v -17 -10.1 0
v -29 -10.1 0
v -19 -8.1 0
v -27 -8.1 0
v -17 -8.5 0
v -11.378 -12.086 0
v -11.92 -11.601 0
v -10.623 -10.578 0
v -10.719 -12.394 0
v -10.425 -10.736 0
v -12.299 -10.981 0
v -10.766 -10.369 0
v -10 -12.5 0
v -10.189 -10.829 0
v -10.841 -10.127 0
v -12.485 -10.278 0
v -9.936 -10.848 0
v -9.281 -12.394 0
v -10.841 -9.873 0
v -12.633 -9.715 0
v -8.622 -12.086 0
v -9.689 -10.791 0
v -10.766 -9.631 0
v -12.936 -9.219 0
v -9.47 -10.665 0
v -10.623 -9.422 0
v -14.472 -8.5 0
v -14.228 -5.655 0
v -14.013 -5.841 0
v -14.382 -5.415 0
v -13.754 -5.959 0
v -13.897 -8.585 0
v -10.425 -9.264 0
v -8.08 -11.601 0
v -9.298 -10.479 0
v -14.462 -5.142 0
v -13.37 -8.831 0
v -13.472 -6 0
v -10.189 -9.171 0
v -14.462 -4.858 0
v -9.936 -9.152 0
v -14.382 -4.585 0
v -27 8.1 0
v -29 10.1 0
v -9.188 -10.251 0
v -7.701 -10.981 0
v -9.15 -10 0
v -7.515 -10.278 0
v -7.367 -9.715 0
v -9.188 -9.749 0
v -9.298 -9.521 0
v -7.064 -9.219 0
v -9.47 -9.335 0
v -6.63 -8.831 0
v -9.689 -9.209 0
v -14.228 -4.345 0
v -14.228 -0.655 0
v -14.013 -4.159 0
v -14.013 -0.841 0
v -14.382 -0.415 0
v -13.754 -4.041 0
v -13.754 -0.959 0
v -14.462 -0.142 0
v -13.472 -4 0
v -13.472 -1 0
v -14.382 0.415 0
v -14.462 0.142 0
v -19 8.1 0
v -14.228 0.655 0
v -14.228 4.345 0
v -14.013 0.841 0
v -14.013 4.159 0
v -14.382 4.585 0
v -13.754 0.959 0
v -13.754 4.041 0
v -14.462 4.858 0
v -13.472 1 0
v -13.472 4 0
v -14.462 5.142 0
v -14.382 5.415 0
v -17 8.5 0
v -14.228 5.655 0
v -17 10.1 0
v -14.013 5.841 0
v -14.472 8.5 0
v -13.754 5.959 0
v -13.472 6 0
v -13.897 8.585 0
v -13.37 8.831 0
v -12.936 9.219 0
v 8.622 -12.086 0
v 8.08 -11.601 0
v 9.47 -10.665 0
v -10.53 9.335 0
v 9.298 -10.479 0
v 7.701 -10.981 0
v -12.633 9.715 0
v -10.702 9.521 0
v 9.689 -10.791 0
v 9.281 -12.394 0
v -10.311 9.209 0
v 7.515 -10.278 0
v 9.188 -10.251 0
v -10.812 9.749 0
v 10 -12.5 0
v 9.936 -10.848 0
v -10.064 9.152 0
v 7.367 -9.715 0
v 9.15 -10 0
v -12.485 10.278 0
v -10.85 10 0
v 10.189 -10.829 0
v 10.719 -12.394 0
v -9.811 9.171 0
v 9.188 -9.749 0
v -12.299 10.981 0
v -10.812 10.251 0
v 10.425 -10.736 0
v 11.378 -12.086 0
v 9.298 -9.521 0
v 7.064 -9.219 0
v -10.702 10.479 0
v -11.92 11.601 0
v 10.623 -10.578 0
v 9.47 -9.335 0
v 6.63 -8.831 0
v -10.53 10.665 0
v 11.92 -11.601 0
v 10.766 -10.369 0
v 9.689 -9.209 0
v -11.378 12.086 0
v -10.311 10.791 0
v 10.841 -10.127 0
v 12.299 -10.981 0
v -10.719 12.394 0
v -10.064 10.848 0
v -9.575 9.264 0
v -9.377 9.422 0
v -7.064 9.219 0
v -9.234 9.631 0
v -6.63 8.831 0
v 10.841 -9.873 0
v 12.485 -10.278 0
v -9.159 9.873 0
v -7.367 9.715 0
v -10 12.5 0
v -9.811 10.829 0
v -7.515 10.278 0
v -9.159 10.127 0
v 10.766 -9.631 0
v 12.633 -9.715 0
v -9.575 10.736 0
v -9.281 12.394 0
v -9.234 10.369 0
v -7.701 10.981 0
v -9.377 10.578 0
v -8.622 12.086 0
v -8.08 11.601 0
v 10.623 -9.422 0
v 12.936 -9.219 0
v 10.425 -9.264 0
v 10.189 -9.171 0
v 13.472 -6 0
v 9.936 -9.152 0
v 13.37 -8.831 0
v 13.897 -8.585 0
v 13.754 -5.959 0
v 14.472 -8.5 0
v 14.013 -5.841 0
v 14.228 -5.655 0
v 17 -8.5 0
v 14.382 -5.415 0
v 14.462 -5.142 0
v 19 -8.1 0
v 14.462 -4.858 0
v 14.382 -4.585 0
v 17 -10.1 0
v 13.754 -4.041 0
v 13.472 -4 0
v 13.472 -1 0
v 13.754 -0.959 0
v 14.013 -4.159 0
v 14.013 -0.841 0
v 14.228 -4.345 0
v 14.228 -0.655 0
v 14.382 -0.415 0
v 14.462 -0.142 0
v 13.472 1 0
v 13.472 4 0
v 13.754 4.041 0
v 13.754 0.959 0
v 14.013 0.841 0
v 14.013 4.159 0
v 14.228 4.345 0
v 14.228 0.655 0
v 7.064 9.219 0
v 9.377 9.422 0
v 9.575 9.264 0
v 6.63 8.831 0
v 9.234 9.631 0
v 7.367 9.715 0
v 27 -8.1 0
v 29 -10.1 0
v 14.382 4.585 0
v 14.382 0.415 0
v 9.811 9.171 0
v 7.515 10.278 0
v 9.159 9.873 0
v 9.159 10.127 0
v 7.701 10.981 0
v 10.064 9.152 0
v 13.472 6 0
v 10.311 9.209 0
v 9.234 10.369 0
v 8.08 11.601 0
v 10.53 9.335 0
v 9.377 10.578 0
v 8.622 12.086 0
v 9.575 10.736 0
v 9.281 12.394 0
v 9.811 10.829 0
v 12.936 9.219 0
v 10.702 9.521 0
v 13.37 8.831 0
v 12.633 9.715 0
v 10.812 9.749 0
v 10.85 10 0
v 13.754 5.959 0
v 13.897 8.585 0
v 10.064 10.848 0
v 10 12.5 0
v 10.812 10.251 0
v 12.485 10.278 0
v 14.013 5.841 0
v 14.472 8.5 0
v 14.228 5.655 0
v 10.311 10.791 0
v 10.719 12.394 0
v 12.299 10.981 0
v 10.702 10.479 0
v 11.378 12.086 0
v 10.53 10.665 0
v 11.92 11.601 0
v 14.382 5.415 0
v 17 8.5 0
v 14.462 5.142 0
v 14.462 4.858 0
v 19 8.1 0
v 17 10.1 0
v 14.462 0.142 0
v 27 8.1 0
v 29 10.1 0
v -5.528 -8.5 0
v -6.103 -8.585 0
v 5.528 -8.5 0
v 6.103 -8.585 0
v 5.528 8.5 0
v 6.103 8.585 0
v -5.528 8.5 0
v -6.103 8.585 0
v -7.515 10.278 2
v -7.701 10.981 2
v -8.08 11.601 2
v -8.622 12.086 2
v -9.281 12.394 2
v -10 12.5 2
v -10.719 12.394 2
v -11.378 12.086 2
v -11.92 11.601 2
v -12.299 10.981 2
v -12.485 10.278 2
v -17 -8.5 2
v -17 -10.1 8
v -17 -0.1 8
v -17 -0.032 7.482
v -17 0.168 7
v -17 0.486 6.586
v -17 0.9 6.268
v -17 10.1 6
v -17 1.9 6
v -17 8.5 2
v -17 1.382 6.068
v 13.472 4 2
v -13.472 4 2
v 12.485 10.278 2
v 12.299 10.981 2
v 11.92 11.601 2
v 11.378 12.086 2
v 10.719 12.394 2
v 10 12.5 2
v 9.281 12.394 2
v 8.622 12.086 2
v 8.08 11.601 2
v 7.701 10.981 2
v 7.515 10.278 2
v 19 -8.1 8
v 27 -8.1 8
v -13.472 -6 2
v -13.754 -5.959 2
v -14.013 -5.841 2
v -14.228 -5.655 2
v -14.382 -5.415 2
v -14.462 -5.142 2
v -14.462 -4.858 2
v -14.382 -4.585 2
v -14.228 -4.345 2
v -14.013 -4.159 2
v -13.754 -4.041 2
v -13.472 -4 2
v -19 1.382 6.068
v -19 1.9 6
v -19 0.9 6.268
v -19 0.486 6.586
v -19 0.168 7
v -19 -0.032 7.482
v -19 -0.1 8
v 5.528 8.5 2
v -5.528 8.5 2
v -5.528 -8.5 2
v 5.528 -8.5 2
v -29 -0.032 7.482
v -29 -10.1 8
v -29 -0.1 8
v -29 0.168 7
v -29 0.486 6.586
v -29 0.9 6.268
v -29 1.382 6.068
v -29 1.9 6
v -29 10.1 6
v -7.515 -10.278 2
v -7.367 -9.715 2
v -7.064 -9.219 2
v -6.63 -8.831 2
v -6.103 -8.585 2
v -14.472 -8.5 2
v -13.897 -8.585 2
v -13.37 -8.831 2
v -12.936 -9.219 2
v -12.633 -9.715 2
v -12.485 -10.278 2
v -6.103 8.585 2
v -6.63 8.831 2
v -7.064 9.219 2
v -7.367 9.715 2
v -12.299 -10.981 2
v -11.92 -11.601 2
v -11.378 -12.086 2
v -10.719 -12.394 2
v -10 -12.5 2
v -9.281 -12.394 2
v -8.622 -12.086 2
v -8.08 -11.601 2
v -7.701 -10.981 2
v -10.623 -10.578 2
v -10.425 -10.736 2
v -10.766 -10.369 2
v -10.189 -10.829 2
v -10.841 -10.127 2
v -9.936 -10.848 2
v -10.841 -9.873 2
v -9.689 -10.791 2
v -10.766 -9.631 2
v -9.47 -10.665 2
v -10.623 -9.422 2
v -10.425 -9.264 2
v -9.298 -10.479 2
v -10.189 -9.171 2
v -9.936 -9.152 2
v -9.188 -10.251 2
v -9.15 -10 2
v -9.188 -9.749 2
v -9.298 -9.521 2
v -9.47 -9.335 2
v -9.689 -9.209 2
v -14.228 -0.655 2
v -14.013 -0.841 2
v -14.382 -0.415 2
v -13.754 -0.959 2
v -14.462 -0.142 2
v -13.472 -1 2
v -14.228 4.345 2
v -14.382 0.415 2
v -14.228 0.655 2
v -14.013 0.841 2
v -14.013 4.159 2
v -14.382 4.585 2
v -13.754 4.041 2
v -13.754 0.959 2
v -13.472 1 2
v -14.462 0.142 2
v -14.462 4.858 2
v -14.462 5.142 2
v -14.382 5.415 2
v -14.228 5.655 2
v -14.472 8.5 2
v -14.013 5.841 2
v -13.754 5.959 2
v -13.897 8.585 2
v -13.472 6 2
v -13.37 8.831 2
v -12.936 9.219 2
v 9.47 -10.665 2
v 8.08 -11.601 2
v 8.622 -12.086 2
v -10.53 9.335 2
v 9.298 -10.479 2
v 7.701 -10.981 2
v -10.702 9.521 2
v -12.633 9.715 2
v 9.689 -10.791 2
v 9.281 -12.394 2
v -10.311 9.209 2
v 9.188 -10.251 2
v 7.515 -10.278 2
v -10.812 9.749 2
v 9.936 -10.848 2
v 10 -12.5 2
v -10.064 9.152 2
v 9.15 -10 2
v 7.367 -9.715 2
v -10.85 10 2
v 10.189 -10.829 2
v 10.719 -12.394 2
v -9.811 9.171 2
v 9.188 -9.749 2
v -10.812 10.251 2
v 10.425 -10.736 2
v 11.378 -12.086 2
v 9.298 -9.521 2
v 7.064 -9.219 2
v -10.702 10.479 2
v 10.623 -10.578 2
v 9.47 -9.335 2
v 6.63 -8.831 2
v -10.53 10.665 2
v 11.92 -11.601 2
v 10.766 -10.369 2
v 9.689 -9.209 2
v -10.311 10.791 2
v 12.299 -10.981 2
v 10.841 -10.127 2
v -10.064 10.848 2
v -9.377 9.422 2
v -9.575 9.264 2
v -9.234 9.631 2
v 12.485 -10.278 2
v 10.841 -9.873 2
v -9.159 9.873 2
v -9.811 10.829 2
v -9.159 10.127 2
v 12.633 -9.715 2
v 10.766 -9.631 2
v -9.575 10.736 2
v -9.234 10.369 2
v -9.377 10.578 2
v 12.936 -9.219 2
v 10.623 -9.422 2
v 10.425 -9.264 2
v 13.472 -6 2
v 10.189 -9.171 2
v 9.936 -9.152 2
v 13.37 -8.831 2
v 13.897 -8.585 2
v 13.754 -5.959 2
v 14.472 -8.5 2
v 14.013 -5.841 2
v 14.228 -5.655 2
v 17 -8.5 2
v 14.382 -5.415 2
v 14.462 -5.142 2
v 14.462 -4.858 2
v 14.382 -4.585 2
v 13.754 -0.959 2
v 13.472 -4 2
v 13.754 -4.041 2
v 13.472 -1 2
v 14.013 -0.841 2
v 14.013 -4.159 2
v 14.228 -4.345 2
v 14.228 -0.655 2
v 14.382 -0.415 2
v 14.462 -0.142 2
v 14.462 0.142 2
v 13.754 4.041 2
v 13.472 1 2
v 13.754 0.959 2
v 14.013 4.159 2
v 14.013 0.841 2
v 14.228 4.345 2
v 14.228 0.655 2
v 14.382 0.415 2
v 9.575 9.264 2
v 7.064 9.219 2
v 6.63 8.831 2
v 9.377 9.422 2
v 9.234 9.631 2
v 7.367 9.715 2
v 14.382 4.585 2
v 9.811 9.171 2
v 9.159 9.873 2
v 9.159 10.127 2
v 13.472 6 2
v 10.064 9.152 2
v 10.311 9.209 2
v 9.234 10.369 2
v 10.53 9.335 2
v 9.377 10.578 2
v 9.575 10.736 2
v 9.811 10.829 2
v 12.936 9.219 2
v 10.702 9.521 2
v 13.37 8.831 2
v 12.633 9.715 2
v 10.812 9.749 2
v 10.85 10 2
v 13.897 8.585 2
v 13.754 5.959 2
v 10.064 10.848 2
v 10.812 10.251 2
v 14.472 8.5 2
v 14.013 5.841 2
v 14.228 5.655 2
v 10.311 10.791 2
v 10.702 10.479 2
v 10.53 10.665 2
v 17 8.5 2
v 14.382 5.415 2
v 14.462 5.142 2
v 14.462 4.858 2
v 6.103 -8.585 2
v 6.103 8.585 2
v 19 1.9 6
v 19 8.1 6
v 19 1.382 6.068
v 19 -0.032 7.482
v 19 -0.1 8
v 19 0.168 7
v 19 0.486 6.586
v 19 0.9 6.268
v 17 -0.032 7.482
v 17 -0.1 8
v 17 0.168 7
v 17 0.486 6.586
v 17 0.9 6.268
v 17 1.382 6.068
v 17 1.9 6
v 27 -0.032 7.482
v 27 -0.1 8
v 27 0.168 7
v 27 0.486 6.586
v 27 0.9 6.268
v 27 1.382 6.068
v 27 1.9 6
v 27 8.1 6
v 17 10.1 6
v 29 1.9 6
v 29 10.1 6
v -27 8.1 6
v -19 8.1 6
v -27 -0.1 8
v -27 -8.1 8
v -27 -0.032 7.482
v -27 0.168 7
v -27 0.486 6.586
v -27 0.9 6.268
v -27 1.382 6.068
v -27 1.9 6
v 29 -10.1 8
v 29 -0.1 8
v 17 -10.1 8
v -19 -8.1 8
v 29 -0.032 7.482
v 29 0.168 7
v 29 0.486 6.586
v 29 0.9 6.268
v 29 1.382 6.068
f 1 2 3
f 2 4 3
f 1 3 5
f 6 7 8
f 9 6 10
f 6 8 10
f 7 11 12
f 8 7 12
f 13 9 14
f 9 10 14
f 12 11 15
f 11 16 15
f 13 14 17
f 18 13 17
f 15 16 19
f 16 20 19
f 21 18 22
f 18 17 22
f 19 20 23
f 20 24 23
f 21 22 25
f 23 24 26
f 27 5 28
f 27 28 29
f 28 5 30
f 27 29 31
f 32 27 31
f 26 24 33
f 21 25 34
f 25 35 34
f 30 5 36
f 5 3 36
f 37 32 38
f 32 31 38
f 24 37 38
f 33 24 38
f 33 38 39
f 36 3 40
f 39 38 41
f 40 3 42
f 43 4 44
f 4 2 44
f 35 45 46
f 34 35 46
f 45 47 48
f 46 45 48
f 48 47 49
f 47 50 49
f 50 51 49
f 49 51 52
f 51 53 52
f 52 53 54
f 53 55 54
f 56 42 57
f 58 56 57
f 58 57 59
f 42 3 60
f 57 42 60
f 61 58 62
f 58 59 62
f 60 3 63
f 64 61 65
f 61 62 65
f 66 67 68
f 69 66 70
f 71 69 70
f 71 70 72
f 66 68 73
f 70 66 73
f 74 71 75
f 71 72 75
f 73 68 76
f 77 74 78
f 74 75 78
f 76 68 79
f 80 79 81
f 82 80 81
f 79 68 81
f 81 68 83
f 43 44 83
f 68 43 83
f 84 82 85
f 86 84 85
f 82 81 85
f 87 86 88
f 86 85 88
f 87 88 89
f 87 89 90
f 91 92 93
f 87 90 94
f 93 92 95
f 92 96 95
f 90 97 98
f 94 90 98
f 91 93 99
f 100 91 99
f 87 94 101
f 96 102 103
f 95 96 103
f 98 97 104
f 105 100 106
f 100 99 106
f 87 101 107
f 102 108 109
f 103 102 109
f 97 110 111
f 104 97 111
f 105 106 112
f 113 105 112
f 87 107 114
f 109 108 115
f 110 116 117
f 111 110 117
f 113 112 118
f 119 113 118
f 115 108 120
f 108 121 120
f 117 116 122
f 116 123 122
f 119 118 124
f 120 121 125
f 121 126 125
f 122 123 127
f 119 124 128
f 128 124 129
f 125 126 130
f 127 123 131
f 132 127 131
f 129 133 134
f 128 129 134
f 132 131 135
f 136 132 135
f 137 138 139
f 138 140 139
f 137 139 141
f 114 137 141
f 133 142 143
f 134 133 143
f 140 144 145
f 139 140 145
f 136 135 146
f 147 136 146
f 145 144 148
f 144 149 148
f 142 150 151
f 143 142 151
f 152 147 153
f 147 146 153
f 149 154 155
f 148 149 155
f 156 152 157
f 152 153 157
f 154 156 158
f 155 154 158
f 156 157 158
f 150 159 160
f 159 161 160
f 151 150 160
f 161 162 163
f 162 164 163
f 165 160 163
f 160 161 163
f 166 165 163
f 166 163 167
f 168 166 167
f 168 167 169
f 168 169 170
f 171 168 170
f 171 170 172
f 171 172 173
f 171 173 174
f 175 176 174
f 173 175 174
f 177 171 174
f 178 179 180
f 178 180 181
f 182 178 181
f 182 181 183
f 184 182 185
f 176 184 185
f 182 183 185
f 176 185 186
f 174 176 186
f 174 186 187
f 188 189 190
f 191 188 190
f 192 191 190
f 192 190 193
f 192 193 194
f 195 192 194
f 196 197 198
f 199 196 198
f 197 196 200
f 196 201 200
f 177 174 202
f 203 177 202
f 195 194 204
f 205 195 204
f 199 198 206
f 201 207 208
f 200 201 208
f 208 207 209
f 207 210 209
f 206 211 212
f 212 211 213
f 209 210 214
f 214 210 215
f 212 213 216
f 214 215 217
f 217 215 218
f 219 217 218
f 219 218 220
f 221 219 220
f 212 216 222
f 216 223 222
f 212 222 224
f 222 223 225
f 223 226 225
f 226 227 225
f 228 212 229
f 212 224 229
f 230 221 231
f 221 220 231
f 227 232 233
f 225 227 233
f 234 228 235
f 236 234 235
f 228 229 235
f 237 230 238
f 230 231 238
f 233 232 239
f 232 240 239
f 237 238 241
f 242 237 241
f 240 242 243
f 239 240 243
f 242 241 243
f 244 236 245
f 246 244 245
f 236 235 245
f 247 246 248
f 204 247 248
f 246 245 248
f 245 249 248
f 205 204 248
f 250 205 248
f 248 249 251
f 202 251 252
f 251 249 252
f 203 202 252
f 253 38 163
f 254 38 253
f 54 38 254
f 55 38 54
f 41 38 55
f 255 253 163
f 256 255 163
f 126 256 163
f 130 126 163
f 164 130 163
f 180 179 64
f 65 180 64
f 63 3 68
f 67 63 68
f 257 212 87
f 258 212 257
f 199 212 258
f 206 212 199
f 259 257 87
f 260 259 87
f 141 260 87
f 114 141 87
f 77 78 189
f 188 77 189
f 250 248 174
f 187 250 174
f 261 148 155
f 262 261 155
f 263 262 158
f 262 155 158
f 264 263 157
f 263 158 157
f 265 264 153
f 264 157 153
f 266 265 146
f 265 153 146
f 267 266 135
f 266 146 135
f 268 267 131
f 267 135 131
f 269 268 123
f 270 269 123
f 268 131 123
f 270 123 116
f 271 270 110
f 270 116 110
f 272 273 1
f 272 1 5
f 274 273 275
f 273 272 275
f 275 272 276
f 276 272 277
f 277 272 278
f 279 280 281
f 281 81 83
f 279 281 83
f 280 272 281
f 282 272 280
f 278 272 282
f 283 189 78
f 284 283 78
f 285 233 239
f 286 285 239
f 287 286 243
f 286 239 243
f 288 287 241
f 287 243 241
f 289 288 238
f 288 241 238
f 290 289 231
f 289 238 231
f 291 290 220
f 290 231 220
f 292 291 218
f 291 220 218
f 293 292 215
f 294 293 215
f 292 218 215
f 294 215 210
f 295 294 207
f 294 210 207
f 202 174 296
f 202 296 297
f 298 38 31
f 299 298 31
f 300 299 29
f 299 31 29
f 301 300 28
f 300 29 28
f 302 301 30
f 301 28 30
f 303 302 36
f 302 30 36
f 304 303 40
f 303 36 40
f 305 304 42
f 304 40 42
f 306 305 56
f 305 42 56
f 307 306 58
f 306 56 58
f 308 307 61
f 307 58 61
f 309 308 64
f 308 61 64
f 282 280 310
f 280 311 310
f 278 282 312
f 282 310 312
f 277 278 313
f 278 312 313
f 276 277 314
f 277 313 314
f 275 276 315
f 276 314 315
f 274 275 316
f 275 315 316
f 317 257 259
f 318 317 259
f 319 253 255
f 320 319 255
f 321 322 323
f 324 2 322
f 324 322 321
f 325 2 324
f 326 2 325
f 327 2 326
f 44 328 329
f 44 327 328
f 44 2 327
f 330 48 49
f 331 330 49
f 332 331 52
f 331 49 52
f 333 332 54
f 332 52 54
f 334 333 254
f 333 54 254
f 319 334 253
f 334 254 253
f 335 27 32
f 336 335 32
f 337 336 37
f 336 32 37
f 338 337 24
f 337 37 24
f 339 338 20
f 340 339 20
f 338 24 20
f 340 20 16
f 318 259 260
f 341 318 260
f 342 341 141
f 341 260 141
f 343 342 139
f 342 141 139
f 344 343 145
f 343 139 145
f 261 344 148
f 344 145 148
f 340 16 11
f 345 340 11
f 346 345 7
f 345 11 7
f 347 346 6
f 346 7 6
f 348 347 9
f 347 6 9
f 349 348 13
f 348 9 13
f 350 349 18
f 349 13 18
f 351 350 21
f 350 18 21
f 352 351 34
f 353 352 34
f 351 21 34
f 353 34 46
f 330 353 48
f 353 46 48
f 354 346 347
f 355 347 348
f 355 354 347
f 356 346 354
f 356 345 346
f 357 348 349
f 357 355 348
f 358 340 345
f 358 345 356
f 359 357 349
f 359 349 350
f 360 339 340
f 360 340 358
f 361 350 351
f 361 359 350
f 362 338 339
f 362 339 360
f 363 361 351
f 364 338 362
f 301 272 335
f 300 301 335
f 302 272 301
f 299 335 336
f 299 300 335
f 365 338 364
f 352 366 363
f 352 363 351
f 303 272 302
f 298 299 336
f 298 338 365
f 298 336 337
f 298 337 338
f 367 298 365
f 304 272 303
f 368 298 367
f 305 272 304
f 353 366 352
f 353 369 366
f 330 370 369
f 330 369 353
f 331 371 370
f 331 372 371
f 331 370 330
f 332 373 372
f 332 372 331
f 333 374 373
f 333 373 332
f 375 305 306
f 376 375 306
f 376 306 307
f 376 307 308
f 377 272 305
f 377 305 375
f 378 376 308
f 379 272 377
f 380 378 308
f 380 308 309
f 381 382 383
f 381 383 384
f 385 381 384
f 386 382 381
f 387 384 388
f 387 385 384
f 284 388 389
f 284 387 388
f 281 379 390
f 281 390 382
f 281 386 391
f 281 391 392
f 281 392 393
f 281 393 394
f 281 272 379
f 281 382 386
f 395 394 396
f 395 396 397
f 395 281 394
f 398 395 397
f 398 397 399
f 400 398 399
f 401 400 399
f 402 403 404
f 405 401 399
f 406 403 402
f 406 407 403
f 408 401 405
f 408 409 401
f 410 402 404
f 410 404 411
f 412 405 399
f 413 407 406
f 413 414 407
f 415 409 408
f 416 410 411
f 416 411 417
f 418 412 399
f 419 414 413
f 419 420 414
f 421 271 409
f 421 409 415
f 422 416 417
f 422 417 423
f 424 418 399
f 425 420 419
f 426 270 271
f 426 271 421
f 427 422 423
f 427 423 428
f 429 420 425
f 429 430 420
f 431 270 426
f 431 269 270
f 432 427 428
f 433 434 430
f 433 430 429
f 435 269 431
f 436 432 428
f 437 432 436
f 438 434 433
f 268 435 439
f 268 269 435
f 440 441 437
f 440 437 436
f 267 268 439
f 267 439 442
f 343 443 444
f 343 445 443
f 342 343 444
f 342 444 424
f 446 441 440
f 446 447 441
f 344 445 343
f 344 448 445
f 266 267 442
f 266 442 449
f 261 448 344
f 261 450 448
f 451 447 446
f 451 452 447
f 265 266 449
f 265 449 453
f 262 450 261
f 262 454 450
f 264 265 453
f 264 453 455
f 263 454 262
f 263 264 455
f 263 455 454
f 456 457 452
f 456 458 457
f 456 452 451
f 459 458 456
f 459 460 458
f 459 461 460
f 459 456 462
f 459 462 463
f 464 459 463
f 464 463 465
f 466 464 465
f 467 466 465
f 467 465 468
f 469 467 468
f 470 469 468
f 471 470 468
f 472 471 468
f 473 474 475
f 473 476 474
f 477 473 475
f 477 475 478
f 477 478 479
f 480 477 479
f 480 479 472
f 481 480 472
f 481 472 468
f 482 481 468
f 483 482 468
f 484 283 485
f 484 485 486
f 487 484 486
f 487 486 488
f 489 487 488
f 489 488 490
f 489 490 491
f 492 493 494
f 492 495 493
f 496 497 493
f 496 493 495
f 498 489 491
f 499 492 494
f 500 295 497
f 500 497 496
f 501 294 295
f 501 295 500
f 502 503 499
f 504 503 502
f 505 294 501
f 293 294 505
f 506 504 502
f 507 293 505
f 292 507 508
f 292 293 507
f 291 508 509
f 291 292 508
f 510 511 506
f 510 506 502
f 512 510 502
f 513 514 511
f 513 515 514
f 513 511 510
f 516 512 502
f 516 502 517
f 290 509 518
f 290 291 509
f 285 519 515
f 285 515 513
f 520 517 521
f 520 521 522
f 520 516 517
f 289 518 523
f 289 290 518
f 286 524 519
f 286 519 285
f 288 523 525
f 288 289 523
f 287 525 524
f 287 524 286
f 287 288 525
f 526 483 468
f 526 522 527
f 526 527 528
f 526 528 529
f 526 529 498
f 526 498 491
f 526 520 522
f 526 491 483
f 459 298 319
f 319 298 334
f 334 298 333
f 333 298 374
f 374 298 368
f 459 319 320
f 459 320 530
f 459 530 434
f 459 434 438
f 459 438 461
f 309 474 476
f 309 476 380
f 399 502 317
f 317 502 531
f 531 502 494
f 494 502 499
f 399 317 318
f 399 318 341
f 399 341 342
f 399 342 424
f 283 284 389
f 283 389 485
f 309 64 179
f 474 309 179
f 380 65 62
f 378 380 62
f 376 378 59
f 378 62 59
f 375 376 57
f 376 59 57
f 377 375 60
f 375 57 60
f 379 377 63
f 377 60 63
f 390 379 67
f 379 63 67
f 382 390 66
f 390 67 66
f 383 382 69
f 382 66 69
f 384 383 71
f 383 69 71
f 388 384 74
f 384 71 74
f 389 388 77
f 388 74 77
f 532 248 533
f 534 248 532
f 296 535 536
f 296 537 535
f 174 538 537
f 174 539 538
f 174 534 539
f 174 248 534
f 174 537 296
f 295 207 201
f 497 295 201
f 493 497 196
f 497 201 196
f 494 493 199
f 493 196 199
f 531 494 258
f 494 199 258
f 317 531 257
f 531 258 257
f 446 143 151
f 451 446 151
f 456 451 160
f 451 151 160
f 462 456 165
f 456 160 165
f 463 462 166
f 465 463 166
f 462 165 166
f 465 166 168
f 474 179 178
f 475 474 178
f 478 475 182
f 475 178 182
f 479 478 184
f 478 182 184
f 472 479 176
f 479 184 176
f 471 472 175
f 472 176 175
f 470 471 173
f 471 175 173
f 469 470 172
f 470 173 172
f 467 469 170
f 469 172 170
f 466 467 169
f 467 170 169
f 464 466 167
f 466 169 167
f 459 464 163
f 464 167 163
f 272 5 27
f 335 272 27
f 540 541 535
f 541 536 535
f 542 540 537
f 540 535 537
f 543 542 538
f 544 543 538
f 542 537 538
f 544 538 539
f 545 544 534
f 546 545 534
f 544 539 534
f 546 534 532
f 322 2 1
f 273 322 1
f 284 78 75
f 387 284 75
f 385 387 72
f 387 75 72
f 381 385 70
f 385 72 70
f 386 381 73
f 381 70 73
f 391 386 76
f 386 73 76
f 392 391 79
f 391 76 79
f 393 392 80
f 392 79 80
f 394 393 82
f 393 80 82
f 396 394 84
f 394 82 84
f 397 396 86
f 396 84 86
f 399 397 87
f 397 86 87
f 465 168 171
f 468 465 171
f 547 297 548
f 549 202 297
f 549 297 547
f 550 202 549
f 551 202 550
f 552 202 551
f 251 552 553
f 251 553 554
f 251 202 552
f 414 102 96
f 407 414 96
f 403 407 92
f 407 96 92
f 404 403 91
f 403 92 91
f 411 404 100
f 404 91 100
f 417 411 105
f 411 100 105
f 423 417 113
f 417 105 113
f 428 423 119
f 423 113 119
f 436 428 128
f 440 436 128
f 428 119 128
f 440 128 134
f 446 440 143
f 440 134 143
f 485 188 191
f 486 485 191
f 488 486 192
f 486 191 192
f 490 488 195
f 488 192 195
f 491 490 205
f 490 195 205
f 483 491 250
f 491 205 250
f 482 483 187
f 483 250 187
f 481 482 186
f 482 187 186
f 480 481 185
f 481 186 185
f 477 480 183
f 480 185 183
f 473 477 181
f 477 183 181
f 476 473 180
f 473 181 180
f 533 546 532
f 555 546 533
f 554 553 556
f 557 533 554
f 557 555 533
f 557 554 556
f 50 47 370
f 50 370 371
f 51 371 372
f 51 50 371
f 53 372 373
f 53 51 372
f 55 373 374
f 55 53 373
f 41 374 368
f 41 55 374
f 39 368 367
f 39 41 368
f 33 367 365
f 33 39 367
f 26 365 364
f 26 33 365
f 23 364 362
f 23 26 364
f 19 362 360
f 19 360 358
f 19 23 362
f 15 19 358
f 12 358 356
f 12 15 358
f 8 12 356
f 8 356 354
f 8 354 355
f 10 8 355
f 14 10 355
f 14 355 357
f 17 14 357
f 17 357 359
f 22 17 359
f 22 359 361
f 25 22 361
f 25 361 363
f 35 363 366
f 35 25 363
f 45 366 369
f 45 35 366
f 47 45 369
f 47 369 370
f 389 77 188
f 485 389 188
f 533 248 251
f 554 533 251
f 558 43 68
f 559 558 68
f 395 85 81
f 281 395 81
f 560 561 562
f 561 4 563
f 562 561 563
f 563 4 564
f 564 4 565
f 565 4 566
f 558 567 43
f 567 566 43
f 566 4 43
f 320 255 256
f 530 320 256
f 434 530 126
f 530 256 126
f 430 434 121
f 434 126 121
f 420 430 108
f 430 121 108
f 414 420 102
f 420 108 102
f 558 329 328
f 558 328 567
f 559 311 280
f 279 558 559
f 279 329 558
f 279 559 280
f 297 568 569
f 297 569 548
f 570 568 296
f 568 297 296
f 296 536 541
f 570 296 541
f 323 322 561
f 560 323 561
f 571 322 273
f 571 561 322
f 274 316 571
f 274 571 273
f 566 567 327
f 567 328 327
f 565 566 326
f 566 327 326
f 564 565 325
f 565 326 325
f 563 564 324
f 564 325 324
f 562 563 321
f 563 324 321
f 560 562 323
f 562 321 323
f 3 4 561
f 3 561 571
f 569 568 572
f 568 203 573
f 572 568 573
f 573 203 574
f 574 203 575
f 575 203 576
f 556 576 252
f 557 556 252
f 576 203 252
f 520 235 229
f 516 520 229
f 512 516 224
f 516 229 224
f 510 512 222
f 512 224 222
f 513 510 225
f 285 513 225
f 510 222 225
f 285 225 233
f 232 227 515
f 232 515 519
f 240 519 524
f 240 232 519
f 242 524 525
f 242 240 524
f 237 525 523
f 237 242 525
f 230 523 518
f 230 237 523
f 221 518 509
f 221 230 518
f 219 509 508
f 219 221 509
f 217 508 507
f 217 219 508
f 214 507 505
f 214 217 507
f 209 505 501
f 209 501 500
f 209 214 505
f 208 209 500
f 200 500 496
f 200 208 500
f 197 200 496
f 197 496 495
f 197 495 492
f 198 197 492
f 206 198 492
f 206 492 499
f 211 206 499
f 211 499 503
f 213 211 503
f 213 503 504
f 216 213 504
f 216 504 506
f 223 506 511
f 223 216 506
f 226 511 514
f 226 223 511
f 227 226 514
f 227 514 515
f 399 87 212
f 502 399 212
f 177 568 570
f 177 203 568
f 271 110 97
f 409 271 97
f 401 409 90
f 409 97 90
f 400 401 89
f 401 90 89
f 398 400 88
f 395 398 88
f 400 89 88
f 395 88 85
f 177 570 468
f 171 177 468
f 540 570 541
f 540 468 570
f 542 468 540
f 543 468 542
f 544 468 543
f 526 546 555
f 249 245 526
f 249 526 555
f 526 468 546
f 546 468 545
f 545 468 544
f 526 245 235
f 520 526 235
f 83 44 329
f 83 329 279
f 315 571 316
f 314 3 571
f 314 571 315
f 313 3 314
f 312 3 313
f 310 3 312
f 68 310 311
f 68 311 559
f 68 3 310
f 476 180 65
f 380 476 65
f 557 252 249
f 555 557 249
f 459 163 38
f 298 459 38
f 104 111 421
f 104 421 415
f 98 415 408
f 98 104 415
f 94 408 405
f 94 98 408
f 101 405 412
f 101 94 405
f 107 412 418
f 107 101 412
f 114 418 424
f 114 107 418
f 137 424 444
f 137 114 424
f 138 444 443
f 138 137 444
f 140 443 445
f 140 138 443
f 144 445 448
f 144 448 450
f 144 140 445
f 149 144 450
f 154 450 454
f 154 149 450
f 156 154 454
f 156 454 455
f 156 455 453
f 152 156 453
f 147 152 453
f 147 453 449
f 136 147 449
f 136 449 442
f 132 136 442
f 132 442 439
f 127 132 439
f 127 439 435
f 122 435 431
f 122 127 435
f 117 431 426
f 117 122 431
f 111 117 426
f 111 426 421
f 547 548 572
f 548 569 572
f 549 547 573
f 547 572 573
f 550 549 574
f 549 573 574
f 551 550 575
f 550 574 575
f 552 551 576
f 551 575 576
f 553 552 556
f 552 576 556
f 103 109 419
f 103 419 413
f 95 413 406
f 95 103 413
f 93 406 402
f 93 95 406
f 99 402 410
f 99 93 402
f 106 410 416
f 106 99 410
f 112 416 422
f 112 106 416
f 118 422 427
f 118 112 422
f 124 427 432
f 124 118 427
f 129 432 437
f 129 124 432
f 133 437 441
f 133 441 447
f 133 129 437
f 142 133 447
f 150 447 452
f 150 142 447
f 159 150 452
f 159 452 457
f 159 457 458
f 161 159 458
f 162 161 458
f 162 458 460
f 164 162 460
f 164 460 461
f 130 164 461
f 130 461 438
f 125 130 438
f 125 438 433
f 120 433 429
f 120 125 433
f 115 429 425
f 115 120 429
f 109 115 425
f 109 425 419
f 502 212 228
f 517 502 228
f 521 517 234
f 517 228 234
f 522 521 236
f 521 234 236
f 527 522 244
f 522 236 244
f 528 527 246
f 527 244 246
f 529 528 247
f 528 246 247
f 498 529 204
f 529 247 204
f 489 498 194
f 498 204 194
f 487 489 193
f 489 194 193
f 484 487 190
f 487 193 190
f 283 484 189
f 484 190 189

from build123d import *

# Parameters (mm, degrees)
SKETCH2_R           = 0.85
SKETCH2_W           = 8
SKETCH2_H           = 16.2
BOSS_EXTRUDE1_DEPTH = 2
SKETCH6_W           = 12
SKETCH6_H           = 20.2
SKETCH6_W_2         = 8
SKETCH6_H_2         = 16.2
BOSS_EXTRUDE5_DEPTH = 4
BOSS_EXTRUDE6_DEPTH = 2
FILLET1_R           = 2


with BuildPart() as part:
    # Sketch2 → Boss-Extrude1 (new body)
    with BuildSketch(Plane.XY):
        with BuildLine():
            Line((5.527864045, 8.5), (-5.527864045, 8.5))
            ThreePointArc((-5.527864045, 8.5), (-6.861197378, 9.009288015), (-7.515480025, 10.277777778))
            ThreePointArc((-7.515480025, 10.277777778), (-10, 12.5), (-12.484519975, 10.277777778))
            ThreePointArc((-12.484519975, 10.277777778), (-13.138802622, 9.009288015), (-14.472135955, 8.5))
            Line((-14.472135955, 8.5), (-17, 8.5))
            Line((-17, 8.5), (-17, 10.1))
            Line((-17, 10.1), (-29, 10.1))
            Line((-29, 10.1), (-29, 0))
            Line((-29, 0), (-29, -10.1))
            Line((-29, -10.1), (-17, -10.1))
            Line((-17, -10.1), (-17, -8.5))
            Line((-17, -8.5), (-14.472135955, -8.5))
            ThreePointArc((-14.472135955, -8.5), (-13.138802622, -9.009288015), (-12.484519975, -10.277777778))
            ThreePointArc((-12.484519975, -10.277777778), (-10, -12.5), (-7.515480025, -10.277777778))
            ThreePointArc((-7.515480025, -10.277777778), (-6.861197378, -9.009288015), (-5.527864045, -8.5))
            Line((-5.527864045, -8.5), (5.527864045, -8.5))
            ThreePointArc((5.527864045, -8.5), (6.861197378, -9.009288015), (7.515480025, -10.277777778))
            ThreePointArc((7.515480025, -10.277777778), (10, -12.5), (12.484519975, -10.277777778))
            ThreePointArc((12.484519975, -10.277777778), (13.138802622, -9.009288015), (14.472135955, -8.5))
            Line((14.472135955, -8.5), (17, -8.5))
            Line((17, -8.5), (17, -10.1))
            Line((17, -10.1), (29, -10.1))
            Line((29, -10.1), (29, 0))
            Line((29, 0), (29, 10.1))
            Line((29, 10.1), (17, 10.1))
            Line((17, 10.1), (17, 8.5))
            Line((17, 8.5), (14.472135955, 8.5))
            ThreePointArc((14.472135955, 8.5), (13.138802622, 9.009288015), (12.484519975, 10.277777778))
            ThreePointArc((12.484519975, 10.277777778), (10, 12.5), (7.515480025, 10.277777778))
            ThreePointArc((7.515480025, 10.277777778), (6.861197378, 9.009288015), (5.527864045, 8.5))
        make_face()
        with Locations((10, 10)):
            Circle(SKETCH2_R, mode=Mode.SUBTRACT)
        with Locations(Location((-10, 10, 0), (0, 0, 180))):
            Circle(SKETCH2_R, mode=Mode.SUBTRACT)
        with Locations((-10, -10)):
            Circle(SKETCH2_R, mode=Mode.SUBTRACT)
        with Locations(Location((10, -10, 0), (0, 0, 180))):
            Circle(SKETCH2_R, mode=Mode.SUBTRACT)
        with Locations((23, 0)):
            Rectangle(SKETCH2_W, SKETCH2_H, mode=Mode.SUBTRACT)
        with Locations((-23, 0)):
            Rectangle(SKETCH2_W, SKETCH2_H, mode=Mode.SUBTRACT)
        with BuildLine():
            Line((-13.472135955, 6), (13.472135955, 6))
            ThreePointArc((13.472135955, 6), (14.472135955, 5), (13.472135955, 4))
            Line((13.472135955, 4), (-13.472135955, 4))
            ThreePointArc((-13.472135955, 4), (-14.472135955, 5), (-13.472135955, 6))
        make_face(mode=Mode.SUBTRACT)
        with BuildLine():
            Line((13.472135955, -1), (-13.472135955, -1))
            ThreePointArc((-13.472135955, -1), (-14.472135955, 0), (-13.472135955, 1))
            Line((-13.472135955, 1), (13.472135955, 1))
            ThreePointArc((13.472135955, 1), (14.472135955, 0), (13.472135955, -1))
        make_face(mode=Mode.SUBTRACT)
        with BuildLine():
            Line((13.472135955, -6), (-13.472135955, -6))
            ThreePointArc((-13.472135955, -6), (-14.472135955, -5), (-13.472135955, -4))
            Line((-13.472135955, -4), (13.472135955, -4))
            ThreePointArc((13.472135955, -4), (14.472135955, -5), (13.472135955, -6))
        make_face(mode=Mode.SUBTRACT)
    extrude(amount=BOSS_EXTRUDE1_DEPTH)

    # Sketch6 → Boss-Extrude5 (add)
    # profile 1 of 2: a face of its own
    with BuildSketch(Plane.XY.offset(2)):
        with Locations((-23, 0)):
            Rectangle(SKETCH6_W, SKETCH6_H)
        with Locations((-23, 0)):
            Rectangle(SKETCH6_W_2, SKETCH6_H_2, mode=Mode.SUBTRACT)
    # profile 2 of 2: a face of its own
    with BuildSketch(Plane.XY.offset(2)):
        with Locations((23, 0)):
            Rectangle(SKETCH6_W, SKETCH6_H)
        with Locations((23, 0)):
            Rectangle(SKETCH6_W_2, SKETCH6_H_2, mode=Mode.SUBTRACT)
    extrude(amount=BOSS_EXTRUDE5_DEPTH)

    # Sketch7 → Boss-Extrude6 (add)
    with BuildSketch(Plane.XY.offset(6)):
        Polygon((17, -0.1), (19, -0.1), (19, -8.1), (27, -8.1), (27, -0.1), (29, -0.1), (29, -10.1), (17, -10.1), align=None)
        Polygon((-17, -10.1), (-17, -0.1), (-19, -0.1), (-19, -8.1), (-27, -8.1), (-27, -0.1), (-29, -0.1), (-29, -10.1), align=None)
    extrude(amount=BOSS_EXTRUDE6_DEPTH)

    # Fillet1
    fillet1_edges = [part.edges().sort_by_distance(p)[0] for p in [
        (28, -0.1, 6),
        (18, -0.1, 6),
        (-18, -0.1, 6),
        (-28, -0.1, 6),
    ]]
    fillet(fillet1_edges, radius=FILLET1_R - 0.0001)  # a hair under: the kernel refuses the full size


solid = part.part
